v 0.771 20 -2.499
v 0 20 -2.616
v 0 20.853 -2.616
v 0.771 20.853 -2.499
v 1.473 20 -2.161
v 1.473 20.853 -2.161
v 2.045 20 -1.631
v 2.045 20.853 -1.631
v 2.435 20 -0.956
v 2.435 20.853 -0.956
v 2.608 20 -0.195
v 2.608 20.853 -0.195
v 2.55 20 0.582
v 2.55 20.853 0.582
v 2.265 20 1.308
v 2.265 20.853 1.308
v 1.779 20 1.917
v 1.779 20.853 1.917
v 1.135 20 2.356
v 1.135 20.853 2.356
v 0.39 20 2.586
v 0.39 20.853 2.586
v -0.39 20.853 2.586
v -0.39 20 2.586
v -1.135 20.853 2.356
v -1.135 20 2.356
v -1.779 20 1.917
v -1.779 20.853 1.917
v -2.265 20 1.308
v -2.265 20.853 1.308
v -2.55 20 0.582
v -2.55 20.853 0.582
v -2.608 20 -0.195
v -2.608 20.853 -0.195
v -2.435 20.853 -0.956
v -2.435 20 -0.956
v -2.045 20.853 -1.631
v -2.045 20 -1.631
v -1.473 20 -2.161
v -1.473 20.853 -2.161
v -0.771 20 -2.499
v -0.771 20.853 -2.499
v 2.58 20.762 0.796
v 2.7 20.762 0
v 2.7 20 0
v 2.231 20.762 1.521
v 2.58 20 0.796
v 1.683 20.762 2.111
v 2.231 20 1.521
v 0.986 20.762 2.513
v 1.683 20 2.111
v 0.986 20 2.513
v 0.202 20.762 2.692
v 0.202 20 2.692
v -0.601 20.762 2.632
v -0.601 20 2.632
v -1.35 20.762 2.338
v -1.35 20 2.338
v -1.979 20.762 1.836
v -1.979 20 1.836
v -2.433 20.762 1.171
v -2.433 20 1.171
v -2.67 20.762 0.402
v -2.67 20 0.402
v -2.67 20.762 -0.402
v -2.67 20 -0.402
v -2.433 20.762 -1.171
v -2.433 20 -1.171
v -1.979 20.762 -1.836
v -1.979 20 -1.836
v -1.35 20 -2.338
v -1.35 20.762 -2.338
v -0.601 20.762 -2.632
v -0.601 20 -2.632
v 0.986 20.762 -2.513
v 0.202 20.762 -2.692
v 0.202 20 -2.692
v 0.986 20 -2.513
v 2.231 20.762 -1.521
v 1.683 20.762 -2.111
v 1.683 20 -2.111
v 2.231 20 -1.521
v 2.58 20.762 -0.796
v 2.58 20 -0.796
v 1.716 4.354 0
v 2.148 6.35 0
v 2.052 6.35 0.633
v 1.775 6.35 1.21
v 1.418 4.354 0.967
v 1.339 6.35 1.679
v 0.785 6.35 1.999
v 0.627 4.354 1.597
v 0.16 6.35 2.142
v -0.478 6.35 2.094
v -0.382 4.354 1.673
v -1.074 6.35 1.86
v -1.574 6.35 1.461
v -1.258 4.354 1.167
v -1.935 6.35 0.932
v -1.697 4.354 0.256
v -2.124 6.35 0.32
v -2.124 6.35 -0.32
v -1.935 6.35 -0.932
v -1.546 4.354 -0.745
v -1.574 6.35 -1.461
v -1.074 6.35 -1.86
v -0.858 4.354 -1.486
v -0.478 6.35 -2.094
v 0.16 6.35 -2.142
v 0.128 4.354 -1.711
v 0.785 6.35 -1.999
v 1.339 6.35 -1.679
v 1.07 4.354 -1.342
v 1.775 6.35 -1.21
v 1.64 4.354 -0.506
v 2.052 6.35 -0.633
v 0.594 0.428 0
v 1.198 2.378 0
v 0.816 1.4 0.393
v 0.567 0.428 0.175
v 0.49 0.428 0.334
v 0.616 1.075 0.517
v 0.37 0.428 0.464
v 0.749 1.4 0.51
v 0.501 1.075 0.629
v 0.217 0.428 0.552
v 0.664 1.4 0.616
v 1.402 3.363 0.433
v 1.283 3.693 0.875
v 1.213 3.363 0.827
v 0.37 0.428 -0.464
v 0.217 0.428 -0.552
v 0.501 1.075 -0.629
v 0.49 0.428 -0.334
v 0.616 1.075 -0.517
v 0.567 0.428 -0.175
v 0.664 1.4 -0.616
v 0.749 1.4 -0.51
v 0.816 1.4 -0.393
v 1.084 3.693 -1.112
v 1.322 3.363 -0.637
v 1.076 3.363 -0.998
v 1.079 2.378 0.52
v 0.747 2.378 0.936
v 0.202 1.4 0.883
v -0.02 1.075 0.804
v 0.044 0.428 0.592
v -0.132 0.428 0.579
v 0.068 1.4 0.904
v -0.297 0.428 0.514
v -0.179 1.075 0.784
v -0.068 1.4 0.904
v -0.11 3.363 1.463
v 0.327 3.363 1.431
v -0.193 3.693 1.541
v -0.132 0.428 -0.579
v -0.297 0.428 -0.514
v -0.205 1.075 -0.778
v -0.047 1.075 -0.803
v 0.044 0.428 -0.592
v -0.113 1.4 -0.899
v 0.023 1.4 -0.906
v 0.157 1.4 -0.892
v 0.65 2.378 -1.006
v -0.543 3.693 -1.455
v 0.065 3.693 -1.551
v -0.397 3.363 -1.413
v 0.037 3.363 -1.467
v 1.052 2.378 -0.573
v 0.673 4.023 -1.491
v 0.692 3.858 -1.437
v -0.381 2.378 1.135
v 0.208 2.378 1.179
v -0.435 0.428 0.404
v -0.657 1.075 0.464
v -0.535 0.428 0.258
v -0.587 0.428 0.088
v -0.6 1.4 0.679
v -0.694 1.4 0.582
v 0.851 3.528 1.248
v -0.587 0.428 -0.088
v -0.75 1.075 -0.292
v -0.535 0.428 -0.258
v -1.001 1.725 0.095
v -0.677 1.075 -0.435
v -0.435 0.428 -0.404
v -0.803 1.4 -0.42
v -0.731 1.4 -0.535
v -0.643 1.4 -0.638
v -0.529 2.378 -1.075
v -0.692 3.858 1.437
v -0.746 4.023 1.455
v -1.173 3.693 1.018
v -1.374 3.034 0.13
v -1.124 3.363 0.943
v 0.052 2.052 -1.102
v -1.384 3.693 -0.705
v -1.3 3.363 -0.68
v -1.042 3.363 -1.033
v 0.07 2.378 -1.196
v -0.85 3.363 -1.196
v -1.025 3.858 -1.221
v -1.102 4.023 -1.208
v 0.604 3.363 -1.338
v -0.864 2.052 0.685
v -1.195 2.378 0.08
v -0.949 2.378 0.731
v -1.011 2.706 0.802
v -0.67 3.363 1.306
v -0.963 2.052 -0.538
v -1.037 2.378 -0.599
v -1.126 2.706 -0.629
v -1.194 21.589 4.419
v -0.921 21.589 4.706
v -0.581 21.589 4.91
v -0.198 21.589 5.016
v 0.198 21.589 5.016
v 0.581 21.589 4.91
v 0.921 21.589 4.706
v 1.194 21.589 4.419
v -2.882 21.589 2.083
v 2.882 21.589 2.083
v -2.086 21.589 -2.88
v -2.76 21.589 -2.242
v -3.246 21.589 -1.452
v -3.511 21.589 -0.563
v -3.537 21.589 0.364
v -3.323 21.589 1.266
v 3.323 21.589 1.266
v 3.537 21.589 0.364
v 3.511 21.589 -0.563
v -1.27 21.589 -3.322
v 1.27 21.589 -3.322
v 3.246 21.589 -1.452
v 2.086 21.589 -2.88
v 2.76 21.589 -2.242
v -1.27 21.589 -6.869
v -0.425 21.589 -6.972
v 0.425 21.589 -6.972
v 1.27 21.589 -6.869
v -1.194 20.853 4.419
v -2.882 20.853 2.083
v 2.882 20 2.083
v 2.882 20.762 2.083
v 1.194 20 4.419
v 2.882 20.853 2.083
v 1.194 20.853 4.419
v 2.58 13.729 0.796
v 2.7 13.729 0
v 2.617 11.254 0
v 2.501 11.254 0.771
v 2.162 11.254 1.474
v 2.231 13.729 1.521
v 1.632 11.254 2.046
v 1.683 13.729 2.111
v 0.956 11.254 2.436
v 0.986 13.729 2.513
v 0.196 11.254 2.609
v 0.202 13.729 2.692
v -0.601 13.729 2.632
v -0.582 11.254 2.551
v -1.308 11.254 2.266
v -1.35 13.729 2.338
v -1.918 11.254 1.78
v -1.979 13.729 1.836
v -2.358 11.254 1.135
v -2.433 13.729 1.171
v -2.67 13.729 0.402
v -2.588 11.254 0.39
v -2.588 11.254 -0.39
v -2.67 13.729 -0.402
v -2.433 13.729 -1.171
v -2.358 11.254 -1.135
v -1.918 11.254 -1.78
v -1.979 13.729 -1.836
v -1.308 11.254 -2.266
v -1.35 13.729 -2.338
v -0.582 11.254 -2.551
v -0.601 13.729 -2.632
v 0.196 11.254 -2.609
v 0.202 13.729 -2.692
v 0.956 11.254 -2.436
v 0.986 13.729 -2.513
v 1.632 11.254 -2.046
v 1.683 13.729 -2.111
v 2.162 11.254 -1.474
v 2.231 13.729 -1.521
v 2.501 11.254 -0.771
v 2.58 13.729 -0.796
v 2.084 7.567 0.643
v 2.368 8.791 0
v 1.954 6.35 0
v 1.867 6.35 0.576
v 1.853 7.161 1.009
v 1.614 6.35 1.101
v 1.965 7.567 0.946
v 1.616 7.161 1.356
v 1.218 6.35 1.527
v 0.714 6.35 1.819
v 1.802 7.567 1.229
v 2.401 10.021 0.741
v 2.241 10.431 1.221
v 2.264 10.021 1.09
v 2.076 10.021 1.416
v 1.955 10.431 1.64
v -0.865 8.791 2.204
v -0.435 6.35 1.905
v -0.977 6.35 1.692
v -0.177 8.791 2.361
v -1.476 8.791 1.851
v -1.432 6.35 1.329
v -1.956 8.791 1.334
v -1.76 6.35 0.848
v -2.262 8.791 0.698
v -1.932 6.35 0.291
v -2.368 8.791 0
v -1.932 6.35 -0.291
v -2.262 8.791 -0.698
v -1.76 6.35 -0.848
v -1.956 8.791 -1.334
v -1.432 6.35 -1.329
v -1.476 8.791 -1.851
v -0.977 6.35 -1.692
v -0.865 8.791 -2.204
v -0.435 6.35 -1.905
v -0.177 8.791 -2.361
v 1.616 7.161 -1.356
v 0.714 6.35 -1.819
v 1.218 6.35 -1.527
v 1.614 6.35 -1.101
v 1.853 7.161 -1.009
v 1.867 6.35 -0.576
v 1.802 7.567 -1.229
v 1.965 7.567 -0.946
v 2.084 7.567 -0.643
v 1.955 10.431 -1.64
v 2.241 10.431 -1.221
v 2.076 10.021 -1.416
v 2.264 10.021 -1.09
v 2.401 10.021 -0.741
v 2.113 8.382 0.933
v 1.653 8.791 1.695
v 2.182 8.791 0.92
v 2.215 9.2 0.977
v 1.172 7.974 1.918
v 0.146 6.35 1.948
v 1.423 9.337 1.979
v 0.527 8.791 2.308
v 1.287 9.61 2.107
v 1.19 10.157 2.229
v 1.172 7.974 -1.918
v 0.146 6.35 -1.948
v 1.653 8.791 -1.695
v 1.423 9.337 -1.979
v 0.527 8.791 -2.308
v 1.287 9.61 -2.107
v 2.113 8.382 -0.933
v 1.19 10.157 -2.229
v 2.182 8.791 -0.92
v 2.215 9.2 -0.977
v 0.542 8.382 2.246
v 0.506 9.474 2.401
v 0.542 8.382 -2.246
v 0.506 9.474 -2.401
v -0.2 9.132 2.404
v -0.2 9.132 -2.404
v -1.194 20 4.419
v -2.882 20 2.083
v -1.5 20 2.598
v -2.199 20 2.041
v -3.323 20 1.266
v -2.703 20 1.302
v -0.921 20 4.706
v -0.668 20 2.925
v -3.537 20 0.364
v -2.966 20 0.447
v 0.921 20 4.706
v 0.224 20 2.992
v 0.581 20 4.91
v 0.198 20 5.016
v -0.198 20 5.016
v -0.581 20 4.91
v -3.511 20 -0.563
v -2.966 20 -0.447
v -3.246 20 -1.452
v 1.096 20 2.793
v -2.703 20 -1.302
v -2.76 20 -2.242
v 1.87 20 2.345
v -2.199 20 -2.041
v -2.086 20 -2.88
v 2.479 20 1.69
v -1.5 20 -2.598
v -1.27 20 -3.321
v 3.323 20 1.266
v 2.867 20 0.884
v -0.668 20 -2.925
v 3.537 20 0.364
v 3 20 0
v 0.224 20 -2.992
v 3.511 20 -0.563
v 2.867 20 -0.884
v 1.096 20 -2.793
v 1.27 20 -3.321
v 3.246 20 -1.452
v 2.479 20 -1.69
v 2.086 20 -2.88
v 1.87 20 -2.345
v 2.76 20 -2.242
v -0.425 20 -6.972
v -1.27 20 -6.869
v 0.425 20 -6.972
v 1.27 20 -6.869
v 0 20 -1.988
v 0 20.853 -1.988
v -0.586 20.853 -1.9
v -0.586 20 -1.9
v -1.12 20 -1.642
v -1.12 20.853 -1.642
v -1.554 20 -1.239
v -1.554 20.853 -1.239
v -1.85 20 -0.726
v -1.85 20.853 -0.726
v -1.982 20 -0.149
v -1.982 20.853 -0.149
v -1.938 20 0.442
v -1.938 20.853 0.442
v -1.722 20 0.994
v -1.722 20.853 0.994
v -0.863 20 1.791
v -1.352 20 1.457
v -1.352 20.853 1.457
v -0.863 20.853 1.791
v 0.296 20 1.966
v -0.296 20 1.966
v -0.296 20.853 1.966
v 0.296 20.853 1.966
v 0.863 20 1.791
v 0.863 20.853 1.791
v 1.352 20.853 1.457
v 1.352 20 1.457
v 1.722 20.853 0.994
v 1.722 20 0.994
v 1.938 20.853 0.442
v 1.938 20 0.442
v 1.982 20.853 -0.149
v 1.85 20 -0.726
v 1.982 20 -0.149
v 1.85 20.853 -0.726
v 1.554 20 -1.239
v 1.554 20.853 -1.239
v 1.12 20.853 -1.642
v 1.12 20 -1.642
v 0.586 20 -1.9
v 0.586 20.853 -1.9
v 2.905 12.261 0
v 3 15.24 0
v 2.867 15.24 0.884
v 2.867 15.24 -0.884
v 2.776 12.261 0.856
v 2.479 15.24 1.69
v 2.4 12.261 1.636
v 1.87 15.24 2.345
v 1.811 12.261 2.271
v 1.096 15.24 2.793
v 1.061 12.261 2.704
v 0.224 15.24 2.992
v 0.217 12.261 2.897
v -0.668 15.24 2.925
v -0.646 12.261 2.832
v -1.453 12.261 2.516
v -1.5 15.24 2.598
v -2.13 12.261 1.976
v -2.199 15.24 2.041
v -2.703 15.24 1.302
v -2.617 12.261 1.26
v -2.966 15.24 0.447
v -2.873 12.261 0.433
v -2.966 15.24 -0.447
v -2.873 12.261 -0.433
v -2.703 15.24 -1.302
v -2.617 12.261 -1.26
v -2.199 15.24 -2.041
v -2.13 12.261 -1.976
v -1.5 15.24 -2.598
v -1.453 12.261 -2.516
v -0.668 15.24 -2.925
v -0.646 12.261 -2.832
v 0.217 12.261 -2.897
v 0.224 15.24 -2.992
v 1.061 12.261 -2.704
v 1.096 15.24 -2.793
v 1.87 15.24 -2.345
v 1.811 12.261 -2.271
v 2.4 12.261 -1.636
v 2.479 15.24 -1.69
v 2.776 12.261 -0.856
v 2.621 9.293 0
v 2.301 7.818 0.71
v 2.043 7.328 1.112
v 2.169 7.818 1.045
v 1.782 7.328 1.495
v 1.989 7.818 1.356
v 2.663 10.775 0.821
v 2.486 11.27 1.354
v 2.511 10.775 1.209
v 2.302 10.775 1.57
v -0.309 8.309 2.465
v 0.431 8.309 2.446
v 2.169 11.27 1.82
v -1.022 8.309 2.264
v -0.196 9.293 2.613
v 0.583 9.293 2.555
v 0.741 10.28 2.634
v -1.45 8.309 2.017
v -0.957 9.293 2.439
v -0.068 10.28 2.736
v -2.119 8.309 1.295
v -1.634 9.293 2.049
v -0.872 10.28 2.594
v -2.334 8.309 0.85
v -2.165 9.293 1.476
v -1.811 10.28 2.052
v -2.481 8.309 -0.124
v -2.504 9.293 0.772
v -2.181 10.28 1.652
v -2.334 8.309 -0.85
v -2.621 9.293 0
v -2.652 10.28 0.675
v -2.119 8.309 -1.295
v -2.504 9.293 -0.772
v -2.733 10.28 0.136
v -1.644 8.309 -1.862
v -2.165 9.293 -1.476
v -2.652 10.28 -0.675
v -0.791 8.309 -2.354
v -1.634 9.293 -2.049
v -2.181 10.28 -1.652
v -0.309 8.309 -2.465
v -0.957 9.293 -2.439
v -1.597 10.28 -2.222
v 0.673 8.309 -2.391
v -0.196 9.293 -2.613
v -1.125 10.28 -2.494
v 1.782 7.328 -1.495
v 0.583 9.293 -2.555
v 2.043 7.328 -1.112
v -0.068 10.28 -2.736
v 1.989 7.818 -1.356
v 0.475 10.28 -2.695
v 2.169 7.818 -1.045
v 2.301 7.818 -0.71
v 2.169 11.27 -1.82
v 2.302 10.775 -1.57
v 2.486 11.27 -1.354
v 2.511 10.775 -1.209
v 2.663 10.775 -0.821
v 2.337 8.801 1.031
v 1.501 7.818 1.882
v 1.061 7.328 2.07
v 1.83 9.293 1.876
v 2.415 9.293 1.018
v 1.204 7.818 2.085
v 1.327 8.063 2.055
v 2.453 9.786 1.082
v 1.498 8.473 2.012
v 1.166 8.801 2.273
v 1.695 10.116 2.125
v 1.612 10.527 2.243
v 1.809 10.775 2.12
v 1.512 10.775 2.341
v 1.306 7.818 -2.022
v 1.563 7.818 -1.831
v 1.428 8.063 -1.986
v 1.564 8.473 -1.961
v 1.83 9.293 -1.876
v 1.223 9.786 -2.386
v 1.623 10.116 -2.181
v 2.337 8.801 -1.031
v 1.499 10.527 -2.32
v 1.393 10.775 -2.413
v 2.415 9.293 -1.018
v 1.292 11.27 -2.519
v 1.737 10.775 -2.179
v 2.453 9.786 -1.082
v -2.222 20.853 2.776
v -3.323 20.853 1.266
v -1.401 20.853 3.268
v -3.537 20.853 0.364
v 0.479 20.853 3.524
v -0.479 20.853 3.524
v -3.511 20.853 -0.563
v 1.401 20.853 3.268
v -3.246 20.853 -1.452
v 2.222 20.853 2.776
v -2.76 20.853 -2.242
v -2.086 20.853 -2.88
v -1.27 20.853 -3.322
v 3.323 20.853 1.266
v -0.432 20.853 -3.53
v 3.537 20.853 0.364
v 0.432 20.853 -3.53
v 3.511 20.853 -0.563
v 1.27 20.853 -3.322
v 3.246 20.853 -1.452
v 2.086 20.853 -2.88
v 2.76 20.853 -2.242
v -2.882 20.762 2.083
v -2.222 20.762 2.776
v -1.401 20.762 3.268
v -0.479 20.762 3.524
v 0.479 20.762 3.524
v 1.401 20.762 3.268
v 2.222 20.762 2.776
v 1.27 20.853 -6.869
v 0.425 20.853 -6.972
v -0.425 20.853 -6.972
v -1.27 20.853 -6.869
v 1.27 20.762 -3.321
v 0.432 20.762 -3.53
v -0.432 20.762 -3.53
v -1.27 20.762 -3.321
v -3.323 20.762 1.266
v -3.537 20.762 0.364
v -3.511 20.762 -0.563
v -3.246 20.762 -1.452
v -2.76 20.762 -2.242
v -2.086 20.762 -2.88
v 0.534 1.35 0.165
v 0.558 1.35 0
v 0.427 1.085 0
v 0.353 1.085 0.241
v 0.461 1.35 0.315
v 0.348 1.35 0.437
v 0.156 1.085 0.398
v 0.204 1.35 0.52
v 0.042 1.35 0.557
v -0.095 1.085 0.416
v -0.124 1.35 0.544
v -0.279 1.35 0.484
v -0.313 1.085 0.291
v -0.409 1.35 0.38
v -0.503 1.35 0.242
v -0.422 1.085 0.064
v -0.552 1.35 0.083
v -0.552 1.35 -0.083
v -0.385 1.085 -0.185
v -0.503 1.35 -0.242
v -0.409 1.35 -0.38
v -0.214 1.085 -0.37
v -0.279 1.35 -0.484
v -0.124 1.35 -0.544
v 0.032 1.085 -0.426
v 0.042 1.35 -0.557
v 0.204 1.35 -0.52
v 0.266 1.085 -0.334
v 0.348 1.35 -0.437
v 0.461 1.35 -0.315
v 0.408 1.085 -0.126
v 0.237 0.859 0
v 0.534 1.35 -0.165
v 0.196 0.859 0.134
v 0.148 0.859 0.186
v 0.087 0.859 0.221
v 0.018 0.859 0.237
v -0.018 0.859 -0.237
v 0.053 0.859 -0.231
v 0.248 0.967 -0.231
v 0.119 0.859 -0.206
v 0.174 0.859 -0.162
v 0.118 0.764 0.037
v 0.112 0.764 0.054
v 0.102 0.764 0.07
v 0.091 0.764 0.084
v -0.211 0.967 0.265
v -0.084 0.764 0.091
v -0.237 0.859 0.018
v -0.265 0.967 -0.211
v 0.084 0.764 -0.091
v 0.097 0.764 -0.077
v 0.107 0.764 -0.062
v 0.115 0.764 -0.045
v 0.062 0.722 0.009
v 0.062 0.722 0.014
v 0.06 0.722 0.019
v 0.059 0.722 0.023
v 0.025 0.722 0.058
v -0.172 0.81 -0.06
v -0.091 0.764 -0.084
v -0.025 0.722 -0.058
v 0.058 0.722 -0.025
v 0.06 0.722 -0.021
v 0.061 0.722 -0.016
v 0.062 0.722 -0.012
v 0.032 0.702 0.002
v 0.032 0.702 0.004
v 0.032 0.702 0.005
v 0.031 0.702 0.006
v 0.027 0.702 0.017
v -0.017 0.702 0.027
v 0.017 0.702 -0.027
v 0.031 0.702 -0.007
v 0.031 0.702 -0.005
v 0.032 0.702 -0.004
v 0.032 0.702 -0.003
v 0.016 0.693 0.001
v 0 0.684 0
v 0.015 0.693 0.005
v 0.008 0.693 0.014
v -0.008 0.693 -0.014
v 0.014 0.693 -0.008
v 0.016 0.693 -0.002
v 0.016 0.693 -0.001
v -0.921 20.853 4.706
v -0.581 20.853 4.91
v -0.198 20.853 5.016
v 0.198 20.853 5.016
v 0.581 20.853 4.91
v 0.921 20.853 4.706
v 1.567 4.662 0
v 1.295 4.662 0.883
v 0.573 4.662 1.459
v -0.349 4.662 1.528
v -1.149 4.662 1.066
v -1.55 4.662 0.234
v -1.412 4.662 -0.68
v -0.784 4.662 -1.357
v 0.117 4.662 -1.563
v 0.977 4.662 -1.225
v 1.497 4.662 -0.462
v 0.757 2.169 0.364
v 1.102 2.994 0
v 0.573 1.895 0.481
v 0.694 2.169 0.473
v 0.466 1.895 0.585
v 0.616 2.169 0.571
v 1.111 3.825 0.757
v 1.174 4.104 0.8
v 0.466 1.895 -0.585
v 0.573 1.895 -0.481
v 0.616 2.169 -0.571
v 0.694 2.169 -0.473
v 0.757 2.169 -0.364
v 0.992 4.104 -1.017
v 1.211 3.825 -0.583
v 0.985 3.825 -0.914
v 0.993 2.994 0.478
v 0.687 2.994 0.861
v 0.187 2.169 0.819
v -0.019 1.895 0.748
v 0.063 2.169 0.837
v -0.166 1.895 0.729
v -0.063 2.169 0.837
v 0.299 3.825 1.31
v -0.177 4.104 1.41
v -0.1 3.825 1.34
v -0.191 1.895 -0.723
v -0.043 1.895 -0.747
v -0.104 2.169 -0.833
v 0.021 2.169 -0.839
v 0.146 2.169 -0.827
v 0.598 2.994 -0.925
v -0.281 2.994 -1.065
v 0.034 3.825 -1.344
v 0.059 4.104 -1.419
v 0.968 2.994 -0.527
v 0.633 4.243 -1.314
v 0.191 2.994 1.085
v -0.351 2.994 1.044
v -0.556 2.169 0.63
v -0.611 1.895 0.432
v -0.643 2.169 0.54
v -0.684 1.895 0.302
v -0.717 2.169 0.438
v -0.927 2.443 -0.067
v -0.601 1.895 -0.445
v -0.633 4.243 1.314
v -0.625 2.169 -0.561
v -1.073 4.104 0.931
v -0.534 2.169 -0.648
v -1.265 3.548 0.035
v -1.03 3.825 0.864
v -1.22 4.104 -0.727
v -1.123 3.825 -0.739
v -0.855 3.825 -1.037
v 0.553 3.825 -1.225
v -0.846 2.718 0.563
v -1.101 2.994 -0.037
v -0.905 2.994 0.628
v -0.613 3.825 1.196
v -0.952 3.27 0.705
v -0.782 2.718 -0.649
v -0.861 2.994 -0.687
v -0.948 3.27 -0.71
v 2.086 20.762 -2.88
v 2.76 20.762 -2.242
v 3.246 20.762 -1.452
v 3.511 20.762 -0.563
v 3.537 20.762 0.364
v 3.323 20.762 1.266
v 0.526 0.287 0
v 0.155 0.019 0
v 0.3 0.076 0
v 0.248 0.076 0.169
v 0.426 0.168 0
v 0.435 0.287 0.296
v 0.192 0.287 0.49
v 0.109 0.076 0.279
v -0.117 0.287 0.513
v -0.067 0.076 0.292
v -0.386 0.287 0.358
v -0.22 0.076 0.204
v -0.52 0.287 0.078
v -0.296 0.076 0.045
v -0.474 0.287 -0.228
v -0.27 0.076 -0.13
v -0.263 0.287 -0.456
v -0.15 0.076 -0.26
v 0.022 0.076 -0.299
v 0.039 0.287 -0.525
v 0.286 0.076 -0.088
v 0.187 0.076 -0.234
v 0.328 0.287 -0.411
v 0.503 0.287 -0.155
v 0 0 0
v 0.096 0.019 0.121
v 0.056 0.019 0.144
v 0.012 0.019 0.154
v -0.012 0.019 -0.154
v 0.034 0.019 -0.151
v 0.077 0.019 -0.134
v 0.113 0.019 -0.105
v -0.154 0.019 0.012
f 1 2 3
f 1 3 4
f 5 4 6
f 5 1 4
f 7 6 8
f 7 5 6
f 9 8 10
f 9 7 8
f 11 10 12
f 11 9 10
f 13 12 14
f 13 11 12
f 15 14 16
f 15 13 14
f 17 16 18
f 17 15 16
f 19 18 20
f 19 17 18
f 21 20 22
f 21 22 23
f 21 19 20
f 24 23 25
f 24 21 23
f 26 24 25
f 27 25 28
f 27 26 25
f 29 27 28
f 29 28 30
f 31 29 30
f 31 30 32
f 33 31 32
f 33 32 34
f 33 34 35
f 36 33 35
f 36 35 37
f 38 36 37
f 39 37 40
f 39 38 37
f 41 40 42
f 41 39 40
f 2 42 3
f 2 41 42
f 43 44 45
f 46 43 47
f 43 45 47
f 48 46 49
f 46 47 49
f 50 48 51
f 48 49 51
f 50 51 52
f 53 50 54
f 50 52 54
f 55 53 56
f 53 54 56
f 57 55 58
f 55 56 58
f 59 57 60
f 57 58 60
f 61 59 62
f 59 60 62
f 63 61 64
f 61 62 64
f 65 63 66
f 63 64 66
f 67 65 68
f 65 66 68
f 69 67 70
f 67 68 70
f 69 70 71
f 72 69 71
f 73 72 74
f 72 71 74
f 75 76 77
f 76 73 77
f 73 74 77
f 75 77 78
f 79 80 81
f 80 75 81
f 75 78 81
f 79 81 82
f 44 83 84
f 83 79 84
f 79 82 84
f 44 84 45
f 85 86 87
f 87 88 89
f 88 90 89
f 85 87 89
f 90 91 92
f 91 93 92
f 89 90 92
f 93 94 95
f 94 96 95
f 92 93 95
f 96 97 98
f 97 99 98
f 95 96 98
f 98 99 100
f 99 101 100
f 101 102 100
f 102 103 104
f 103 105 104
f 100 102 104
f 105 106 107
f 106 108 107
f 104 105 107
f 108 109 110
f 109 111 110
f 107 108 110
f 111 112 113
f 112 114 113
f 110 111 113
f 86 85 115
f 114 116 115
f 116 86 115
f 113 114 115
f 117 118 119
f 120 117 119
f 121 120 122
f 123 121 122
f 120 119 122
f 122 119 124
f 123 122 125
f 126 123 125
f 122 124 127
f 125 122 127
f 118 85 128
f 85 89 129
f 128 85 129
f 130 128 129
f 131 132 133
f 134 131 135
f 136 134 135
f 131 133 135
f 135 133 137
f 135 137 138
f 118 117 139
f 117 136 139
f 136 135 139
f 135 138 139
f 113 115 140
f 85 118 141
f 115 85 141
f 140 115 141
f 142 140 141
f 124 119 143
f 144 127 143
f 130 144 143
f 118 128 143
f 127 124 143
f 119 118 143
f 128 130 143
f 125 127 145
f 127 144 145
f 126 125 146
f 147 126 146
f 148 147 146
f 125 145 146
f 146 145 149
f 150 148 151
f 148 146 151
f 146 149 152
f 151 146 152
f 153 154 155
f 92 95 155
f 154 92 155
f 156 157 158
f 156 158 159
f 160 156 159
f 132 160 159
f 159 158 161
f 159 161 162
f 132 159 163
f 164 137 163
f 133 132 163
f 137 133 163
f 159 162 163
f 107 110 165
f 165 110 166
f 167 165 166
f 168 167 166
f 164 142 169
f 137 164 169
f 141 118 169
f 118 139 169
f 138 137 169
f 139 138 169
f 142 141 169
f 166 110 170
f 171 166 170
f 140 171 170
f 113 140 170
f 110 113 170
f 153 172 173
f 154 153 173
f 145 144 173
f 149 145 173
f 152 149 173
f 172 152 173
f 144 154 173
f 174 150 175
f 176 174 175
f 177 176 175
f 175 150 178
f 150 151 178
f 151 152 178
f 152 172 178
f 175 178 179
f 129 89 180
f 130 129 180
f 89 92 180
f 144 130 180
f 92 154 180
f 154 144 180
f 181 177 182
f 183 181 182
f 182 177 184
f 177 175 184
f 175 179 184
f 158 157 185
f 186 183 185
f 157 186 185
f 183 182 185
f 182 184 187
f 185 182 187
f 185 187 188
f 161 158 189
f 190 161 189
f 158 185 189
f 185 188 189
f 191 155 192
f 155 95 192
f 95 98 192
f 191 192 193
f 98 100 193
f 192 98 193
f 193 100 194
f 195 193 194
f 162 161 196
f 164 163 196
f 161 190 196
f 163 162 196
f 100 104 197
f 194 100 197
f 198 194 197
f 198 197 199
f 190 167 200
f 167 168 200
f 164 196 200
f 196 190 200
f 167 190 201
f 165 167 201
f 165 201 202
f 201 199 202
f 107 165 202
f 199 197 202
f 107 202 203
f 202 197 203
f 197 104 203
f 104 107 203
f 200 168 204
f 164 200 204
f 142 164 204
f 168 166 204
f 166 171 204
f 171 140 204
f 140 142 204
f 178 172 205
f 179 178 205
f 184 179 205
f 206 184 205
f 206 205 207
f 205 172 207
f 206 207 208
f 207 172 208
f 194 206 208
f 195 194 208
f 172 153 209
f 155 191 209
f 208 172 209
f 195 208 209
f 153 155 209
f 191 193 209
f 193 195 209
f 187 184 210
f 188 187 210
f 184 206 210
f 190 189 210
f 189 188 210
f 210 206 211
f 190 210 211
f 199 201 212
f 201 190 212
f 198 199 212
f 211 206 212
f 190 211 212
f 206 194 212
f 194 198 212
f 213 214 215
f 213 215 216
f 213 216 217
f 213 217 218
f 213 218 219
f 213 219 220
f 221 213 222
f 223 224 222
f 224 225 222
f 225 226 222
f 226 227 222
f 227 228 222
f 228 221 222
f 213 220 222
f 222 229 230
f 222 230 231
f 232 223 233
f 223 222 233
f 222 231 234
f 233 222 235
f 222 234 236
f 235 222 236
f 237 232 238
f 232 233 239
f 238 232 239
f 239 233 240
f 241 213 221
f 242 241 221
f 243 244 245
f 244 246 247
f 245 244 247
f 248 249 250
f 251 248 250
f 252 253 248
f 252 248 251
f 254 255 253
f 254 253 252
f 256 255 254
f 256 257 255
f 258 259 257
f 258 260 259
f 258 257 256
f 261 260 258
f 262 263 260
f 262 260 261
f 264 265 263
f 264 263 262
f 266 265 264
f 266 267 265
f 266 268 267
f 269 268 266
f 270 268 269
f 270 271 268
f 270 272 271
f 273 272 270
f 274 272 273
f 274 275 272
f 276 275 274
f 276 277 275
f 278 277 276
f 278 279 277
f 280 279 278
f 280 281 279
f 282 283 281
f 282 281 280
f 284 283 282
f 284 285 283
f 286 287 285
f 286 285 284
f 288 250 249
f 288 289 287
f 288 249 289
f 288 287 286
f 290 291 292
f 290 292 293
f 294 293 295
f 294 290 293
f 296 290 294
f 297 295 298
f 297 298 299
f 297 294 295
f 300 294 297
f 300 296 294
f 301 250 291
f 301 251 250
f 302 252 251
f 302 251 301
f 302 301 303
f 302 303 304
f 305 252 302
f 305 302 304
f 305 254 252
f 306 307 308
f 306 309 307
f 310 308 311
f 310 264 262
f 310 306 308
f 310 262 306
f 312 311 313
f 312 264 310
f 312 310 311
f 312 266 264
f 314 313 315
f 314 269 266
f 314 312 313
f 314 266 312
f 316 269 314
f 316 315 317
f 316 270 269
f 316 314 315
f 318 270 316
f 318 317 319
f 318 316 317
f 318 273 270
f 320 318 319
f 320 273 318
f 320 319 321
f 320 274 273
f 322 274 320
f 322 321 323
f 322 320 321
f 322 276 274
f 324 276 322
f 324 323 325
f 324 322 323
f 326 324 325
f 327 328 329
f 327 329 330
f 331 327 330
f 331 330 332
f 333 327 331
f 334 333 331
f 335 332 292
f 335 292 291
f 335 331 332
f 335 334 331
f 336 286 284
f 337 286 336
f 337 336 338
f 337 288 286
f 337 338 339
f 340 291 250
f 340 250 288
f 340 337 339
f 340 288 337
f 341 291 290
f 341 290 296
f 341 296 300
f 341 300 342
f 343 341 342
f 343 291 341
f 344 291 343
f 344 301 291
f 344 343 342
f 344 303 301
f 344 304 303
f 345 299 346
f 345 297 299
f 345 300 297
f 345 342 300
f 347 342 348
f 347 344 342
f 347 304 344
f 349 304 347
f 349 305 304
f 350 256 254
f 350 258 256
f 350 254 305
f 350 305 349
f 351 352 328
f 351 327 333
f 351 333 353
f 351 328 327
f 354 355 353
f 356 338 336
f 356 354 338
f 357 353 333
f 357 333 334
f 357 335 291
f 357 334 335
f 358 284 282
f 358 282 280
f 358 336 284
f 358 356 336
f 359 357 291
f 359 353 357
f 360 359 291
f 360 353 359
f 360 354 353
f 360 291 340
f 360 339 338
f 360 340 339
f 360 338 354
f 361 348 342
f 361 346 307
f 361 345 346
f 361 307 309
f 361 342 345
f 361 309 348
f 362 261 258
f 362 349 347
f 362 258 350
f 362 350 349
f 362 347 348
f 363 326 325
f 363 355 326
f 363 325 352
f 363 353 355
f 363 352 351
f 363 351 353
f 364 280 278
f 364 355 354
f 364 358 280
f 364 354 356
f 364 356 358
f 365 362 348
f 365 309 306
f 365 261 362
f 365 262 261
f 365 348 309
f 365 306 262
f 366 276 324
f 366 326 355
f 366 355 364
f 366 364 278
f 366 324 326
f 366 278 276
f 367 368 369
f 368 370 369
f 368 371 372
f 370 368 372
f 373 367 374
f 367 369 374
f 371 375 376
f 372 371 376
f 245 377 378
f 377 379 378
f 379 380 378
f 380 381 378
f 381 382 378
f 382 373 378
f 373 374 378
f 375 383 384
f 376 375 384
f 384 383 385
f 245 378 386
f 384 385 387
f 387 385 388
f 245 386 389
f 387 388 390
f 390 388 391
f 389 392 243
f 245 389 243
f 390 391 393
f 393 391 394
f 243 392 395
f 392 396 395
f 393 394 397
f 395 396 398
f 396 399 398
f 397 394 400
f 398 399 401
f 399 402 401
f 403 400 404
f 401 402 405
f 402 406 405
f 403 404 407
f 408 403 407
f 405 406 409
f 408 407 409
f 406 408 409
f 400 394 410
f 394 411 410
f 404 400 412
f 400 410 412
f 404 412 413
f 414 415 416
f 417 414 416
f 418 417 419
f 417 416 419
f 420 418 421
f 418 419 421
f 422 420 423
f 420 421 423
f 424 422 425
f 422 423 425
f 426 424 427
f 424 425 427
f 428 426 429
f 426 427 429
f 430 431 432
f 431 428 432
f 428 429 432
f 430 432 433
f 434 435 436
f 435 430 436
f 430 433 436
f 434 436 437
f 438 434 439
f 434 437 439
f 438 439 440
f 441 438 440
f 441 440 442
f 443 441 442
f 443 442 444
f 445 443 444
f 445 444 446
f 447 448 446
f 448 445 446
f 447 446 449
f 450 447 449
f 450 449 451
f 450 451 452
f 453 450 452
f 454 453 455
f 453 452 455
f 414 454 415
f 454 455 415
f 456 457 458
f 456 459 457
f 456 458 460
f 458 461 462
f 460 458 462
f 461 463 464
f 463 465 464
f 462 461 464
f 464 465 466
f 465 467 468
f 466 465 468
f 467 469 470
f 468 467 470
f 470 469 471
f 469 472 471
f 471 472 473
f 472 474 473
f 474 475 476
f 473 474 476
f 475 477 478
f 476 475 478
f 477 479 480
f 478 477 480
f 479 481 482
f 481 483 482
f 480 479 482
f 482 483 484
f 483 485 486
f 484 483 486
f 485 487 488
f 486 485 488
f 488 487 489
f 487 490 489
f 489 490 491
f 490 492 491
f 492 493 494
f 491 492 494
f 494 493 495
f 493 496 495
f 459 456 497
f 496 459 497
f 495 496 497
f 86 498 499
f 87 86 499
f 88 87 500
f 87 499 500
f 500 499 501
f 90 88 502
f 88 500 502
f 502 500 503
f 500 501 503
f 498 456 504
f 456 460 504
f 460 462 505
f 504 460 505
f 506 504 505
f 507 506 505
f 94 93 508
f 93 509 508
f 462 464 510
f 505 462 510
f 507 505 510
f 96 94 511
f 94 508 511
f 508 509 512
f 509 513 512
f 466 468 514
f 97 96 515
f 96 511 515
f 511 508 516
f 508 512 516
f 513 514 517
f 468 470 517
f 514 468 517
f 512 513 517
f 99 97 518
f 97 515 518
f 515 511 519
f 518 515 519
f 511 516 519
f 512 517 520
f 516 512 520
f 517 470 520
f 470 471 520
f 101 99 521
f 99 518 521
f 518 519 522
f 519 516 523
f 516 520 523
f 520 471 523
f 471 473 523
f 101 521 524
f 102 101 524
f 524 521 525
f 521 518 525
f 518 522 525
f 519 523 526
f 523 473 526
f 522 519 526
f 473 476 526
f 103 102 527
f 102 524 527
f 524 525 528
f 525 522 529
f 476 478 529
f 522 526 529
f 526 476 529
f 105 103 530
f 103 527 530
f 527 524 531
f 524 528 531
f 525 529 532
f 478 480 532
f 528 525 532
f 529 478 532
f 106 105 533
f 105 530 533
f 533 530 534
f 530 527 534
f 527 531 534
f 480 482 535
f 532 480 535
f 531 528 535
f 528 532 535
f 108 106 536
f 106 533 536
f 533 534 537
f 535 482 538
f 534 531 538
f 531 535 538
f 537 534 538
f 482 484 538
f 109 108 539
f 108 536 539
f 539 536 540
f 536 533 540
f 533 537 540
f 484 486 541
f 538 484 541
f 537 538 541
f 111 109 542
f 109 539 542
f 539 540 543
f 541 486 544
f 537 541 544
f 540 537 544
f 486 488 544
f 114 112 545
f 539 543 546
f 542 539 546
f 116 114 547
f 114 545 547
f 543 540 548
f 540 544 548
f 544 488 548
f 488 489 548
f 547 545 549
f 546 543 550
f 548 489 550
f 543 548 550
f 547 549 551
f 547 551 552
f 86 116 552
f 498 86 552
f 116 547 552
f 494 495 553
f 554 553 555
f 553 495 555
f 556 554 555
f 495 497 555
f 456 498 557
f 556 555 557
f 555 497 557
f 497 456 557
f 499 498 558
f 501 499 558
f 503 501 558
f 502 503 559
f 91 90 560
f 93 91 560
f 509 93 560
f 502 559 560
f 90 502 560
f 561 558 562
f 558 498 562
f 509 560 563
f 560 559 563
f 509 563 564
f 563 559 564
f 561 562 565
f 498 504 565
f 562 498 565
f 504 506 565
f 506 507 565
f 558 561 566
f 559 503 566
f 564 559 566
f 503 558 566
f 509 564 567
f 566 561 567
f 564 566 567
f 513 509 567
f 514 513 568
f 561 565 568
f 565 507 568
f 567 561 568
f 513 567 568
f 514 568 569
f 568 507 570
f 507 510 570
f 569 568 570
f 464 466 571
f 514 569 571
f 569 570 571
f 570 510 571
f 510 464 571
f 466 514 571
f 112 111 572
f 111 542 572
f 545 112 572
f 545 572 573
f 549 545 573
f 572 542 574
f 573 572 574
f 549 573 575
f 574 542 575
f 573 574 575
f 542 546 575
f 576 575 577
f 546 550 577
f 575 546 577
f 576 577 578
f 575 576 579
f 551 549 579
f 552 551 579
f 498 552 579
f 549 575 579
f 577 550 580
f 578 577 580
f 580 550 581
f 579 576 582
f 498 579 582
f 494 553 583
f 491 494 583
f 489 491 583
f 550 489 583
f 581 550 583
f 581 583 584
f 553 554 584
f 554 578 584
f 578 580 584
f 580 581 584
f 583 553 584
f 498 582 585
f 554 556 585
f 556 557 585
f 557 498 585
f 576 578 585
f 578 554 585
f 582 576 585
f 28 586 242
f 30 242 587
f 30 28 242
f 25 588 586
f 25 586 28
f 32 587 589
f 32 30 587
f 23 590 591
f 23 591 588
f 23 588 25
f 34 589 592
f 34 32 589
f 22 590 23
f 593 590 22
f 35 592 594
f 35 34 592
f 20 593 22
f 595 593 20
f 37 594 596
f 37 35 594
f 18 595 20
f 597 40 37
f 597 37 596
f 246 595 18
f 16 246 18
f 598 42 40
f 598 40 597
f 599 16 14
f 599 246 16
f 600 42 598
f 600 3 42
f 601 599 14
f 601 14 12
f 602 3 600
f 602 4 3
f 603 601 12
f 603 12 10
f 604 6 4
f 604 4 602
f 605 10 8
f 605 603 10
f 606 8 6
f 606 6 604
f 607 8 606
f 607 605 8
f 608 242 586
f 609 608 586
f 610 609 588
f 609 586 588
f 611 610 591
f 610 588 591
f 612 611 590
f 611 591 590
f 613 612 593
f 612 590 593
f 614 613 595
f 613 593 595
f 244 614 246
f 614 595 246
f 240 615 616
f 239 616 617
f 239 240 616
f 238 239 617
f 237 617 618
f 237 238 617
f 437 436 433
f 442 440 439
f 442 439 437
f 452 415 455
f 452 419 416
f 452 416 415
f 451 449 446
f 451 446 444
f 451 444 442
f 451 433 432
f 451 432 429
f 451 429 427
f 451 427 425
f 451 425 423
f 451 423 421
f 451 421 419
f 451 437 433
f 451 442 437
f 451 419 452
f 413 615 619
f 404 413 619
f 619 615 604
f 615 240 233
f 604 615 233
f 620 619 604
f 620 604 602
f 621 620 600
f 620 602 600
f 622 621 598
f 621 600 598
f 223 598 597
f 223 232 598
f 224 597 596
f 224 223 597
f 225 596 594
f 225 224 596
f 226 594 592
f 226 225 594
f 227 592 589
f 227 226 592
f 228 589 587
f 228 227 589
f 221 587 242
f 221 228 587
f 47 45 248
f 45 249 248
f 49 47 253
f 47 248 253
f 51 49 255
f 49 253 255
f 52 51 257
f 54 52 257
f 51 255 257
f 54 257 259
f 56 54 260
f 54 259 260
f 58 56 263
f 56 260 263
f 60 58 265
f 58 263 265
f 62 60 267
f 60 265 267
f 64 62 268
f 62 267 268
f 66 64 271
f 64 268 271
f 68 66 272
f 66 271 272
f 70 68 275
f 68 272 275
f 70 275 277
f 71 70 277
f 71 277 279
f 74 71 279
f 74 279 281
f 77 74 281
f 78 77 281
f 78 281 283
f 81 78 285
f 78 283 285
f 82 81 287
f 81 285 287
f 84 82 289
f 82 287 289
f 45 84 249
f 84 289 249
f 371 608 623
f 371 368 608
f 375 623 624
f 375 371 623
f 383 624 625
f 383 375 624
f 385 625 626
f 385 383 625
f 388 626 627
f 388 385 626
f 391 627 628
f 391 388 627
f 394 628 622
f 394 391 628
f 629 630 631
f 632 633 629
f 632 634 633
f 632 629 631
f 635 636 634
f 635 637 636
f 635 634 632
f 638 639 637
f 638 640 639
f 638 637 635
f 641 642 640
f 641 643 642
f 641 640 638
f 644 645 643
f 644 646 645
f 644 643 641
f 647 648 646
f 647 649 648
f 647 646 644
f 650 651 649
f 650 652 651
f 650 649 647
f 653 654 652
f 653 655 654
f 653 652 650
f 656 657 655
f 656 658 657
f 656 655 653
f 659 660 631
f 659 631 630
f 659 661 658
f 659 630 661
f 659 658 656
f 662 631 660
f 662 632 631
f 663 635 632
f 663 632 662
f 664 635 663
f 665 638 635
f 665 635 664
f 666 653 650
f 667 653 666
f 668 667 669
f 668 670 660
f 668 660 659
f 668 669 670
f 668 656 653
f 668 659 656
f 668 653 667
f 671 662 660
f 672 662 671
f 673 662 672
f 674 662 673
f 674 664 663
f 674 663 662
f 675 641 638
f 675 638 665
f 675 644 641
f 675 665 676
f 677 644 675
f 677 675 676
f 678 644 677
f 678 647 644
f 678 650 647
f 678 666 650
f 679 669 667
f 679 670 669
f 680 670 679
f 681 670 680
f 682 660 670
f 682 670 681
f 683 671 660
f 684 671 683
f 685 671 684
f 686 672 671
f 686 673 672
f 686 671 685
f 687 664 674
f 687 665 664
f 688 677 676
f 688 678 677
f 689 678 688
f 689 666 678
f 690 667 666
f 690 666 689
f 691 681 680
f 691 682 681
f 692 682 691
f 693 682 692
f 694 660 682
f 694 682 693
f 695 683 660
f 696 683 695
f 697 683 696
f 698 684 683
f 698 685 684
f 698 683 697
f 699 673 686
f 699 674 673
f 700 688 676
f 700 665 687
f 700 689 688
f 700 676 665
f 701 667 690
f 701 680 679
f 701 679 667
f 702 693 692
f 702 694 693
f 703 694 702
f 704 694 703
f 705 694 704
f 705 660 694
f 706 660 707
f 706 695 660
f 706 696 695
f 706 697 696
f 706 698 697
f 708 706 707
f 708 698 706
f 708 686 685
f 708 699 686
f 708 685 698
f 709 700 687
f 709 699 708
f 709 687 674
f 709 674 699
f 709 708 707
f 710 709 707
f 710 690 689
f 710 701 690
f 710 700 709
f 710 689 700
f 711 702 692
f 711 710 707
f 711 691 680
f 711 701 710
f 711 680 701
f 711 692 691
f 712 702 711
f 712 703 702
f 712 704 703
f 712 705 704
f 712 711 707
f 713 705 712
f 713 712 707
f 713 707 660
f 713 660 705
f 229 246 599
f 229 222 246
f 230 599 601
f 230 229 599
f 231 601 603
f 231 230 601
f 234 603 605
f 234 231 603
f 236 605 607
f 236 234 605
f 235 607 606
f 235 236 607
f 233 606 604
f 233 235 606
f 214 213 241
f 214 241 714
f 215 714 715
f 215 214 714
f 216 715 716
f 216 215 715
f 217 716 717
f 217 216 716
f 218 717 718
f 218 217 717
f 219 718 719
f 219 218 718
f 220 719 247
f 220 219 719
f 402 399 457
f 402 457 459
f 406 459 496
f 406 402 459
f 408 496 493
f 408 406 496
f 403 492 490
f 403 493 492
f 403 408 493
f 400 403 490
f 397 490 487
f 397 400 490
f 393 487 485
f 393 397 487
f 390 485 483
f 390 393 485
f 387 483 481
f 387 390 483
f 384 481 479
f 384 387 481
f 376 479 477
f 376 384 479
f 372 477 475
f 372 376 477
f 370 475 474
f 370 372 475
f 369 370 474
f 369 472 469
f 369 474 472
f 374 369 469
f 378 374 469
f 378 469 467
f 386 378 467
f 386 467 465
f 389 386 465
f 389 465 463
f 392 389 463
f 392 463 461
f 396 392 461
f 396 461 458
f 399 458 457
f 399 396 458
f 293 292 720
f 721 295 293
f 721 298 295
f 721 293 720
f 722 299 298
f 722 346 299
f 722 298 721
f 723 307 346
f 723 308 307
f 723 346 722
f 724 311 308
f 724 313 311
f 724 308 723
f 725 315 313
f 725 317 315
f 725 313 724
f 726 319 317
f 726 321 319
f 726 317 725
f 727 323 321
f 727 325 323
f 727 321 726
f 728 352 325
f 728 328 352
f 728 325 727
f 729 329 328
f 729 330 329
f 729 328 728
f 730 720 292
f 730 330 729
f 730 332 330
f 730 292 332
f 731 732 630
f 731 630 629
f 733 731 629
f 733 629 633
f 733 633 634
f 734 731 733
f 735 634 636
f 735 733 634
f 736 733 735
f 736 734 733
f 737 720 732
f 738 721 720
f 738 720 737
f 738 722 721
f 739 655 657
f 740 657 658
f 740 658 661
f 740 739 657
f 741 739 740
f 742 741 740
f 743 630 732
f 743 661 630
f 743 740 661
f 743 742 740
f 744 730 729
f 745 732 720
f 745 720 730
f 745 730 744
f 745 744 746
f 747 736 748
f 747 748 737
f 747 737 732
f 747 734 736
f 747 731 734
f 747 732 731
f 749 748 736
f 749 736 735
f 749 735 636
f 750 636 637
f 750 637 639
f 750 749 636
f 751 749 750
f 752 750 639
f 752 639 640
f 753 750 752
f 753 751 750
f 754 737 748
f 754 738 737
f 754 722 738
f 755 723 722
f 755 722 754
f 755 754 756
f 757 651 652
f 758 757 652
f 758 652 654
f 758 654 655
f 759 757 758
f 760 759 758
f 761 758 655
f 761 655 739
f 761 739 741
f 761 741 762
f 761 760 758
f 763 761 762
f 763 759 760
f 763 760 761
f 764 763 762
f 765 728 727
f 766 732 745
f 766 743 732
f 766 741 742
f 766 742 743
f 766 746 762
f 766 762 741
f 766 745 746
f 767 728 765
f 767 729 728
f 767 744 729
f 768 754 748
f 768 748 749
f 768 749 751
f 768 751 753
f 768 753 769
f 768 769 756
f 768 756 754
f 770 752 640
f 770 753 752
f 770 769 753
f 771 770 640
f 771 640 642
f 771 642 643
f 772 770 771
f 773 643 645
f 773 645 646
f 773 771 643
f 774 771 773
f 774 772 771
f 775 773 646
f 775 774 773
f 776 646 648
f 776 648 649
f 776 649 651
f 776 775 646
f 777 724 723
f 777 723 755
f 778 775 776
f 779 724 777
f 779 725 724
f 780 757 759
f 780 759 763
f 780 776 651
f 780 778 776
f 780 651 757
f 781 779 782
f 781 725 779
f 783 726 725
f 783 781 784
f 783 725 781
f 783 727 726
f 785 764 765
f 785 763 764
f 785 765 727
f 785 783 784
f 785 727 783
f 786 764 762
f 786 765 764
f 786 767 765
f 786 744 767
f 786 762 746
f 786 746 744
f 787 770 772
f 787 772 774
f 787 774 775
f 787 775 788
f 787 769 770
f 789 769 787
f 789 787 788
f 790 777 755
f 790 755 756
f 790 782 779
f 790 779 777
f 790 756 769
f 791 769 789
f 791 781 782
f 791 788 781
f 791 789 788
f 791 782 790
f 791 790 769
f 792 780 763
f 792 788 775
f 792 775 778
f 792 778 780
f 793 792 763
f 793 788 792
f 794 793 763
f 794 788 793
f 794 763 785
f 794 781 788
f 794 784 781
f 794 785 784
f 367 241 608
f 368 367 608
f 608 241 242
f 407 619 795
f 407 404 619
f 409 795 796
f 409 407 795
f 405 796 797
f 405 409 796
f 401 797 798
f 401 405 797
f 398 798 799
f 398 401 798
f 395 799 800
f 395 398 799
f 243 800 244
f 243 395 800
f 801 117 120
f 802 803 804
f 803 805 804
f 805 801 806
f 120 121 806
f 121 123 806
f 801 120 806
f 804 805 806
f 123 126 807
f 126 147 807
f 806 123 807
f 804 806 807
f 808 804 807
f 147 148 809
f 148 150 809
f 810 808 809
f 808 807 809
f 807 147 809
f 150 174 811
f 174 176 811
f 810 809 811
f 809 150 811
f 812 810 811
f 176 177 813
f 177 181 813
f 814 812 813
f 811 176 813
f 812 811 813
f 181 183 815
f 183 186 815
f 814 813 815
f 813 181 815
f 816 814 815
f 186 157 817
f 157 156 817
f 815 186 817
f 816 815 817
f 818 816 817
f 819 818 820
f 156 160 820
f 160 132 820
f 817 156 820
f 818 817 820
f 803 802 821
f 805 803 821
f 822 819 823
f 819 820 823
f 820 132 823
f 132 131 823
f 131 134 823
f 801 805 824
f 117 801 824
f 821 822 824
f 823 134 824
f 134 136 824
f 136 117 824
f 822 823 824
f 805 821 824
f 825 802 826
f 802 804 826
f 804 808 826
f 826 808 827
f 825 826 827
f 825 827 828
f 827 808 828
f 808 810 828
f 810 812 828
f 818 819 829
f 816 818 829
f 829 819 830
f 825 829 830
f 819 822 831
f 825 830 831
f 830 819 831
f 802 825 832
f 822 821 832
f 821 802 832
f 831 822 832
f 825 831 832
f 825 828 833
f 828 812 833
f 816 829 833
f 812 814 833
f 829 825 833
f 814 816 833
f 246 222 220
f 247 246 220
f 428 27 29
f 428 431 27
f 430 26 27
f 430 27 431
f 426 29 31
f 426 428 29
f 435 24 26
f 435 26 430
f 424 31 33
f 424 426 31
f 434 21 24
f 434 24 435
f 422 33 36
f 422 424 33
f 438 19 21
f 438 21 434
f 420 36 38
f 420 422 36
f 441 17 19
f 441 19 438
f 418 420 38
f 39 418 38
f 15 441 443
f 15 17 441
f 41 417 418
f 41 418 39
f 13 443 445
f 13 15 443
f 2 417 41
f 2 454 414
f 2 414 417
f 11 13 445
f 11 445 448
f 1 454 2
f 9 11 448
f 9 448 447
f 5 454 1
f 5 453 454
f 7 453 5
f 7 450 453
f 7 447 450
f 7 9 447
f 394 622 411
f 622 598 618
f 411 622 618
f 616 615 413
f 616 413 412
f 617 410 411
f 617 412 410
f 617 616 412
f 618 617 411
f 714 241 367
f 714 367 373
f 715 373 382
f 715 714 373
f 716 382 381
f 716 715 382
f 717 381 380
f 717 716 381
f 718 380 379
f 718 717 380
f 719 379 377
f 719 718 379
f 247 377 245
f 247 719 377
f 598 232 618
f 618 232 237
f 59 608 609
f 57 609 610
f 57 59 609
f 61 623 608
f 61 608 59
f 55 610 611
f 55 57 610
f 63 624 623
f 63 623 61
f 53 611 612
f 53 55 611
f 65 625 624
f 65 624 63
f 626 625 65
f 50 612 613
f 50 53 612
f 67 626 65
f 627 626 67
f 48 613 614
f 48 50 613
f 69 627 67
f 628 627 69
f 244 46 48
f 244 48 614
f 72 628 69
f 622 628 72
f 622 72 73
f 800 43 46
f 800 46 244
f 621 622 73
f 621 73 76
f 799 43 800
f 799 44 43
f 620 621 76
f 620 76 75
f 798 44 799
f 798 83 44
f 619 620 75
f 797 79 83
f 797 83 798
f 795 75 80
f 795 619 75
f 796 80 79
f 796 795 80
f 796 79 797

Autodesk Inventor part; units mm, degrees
ref_plane "YZ Plane" through (0, 0, 0) normal (1, 0, 0) x (0, 1, 0)
ref_plane "XZ Plane" through (0, 0, 0) normal (0, 1, 0) x (-1, 0, 0)
ref_plane "XY Plane" through (0, 0, 0) normal (0, 0, 1) x (1, 0, 0)
sketch "Sketch1" plane through (0, 0, 0) normal (0, 0, 1) x (1, 0, 0)
  line L0 (3, 15.24) -> (3, 20)
  line L1 (3, 20) -> (2.7, 20)
  line L2 (2.7, 20) -> (2.7, 13.7288)
  line L3 (0, 0.6837) -> (0, 0)
  arc A0 (0, 0) -> (0.5935, 0.4276) centre (0, 0.6256) ccw
  arc A1 (0.5935, 0.4276) -> (3, 15.24) centre (-43.7889, 15.24) ccw
  line L4 (0, 0) -> (-1.9294, 0)
  arc A2 (0, 0.6837) -> (0.5584, 1.3498) centre (-0.6188, 1.7696) ccw
  arc A3 (0.5584, 1.3498) -> (2.7, 13.7288) centre (-34.1481, 13.7288) ccw
  line L5 (-6.5051, 6.35) -> (10.1936, 6.35)
  line L6 (2.1819, 6.35) -> (2.1819, 2.9816)
  dimension "d0" = 3
  dimension "d1" = 15.24
  dimension "d2" = 20
  dimension "d3" = 2.7
  dimension "d7" = 6.35
  dimension "d8" = 2.1819
revolve "Revolution1" add sketch "Sketch1" angle 360 about axis through (0, 0.6837, 0) along (0, -1, 0)
sketch "Sketch2" plane through (0, 20, 0) normal (0, 1, 0) x (1, 0, 0)
  circle A0 centre (0, 0) radius 3.556
  circle A1 centre (0, 0) radius 2.7
  dimension "d9" = 7.112
extrude "Extrusion1" add sketch "Sketch2" along normal blind 0.762
sketch "Sketch3" plane through (0, 0, 0) normal (1, 0, 0) x (0, 1, 0)
  line L0 (21.5893, 0) -> (20.8527, 0)
  line L1 (20.8527, 0) -> (20.8527, -6.985)
  line L2 (20.8527, -6.985) -> (21.5893, -6.985)
  line L3 (21.5893, -6.985) -> (21.5893, 0)
  line L4 (20.762, -3.556) -> (20.762, 3.556) projected
  line L5 (20, 3.556) -> (20, -3.556) projected
  line L6 (20.8527, -2.6155) -> (20, -2.6155)
  line L7 (20, -2.6155) -> (20, -1.9879)
  line L8 (20, -1.9879) -> (20.8527, -1.9879)
  line L9 (20.8527, -1.9879) -> (20.8527, -2.6155)
  point P0 (0, 0)
  point P1 (20.762, 0)
  dimension "d12" = 6.985
  dimension "d13" = 0.7366
revolve "Revolution2" add sketch "Sketch3" angle 360 about axis through (0, 21.5893, 0) along (0, -1, 0)
sketch "Sketch4" plane through (0, 21.5893, 0) normal (0, 1, 0) x (1, 0, 0)
  line L0 (-1.1941, -4.4189) -> (-2.8822, -2.0828)
  circle A0 centre (0, 0) radius 3.556 projected
  line L1 (2.8822, -2.0828) -> (1.1941, -4.4189)
  line L2 (1.27, 3.3215) -> (1.27, 6.8686)
  circle A1 centre (0, 0) radius 6.985 projected
  line L3 (-1.27, 3.3215) -> (-1.27, 6.8686)
  line L4 (-1.27, 6.8686) -> (1.27, 6.8686)
  circle A2 centre (0, 0) radius 3.556 projected
  arc A3 (-1.1941, -4.4189) -> (1.1941, -4.4189) centre (0, -3.556) ccw
  line L5 (0, -5.0292) -> (-1.1247, -5.0292)
  point P0 (0, 6.8686)
  dimension "d15" = 2.54
  dimension "d16" = 5.0292
extrude "Extrusion2" cut sketch "Sketch4" against normal blind 25.4 contours A3 L1 A0 L2 A1 L3 L0
sketch "Sketch5" plane through (0, 20.8527, 3.556) normal (0, -1, 0) x (1, 0, 0)
  circle A0 centre (0, -3.556) radius 3.556 projected
  circle A1 centre (0, -3.556) radius 2.6155 projected
  line L0 (1.27, -10.4246) -> (1.27, -6.8775) projected
  arc A2 (1.27, -6.8775) -> (2.8822, -1.4732) centre (0, -3.556) ccw projected
  line L1 (2.8822, -1.4732) -> (1.1941, 0.8629) projected
  arc A3 (1.1941, 0.8629) -> (-1.1941, 0.8629) centre (0, 0) ccw projected
  line L2 (-1.1941, 0.8629) -> (-2.8822, -1.4732) projected
  arc A4 (-2.8822, -1.4732) -> (-1.27, -6.8775) centre (0, -3.556) ccw projected
  line L3 (-1.27, -6.8775) -> (-1.27, -10.4246) projected
  arc A5 (-1.27, -10.4246) -> (1.27, -10.4246) centre (0, -3.556) ccw projected
extrude "Extrusion3" add sketch "Sketch5" along normal up to surface (0.8527 mm away) contours A0 L2 A3 L1 | L0 A5 L3 A0
properties part number "Vial" material "Glass"
